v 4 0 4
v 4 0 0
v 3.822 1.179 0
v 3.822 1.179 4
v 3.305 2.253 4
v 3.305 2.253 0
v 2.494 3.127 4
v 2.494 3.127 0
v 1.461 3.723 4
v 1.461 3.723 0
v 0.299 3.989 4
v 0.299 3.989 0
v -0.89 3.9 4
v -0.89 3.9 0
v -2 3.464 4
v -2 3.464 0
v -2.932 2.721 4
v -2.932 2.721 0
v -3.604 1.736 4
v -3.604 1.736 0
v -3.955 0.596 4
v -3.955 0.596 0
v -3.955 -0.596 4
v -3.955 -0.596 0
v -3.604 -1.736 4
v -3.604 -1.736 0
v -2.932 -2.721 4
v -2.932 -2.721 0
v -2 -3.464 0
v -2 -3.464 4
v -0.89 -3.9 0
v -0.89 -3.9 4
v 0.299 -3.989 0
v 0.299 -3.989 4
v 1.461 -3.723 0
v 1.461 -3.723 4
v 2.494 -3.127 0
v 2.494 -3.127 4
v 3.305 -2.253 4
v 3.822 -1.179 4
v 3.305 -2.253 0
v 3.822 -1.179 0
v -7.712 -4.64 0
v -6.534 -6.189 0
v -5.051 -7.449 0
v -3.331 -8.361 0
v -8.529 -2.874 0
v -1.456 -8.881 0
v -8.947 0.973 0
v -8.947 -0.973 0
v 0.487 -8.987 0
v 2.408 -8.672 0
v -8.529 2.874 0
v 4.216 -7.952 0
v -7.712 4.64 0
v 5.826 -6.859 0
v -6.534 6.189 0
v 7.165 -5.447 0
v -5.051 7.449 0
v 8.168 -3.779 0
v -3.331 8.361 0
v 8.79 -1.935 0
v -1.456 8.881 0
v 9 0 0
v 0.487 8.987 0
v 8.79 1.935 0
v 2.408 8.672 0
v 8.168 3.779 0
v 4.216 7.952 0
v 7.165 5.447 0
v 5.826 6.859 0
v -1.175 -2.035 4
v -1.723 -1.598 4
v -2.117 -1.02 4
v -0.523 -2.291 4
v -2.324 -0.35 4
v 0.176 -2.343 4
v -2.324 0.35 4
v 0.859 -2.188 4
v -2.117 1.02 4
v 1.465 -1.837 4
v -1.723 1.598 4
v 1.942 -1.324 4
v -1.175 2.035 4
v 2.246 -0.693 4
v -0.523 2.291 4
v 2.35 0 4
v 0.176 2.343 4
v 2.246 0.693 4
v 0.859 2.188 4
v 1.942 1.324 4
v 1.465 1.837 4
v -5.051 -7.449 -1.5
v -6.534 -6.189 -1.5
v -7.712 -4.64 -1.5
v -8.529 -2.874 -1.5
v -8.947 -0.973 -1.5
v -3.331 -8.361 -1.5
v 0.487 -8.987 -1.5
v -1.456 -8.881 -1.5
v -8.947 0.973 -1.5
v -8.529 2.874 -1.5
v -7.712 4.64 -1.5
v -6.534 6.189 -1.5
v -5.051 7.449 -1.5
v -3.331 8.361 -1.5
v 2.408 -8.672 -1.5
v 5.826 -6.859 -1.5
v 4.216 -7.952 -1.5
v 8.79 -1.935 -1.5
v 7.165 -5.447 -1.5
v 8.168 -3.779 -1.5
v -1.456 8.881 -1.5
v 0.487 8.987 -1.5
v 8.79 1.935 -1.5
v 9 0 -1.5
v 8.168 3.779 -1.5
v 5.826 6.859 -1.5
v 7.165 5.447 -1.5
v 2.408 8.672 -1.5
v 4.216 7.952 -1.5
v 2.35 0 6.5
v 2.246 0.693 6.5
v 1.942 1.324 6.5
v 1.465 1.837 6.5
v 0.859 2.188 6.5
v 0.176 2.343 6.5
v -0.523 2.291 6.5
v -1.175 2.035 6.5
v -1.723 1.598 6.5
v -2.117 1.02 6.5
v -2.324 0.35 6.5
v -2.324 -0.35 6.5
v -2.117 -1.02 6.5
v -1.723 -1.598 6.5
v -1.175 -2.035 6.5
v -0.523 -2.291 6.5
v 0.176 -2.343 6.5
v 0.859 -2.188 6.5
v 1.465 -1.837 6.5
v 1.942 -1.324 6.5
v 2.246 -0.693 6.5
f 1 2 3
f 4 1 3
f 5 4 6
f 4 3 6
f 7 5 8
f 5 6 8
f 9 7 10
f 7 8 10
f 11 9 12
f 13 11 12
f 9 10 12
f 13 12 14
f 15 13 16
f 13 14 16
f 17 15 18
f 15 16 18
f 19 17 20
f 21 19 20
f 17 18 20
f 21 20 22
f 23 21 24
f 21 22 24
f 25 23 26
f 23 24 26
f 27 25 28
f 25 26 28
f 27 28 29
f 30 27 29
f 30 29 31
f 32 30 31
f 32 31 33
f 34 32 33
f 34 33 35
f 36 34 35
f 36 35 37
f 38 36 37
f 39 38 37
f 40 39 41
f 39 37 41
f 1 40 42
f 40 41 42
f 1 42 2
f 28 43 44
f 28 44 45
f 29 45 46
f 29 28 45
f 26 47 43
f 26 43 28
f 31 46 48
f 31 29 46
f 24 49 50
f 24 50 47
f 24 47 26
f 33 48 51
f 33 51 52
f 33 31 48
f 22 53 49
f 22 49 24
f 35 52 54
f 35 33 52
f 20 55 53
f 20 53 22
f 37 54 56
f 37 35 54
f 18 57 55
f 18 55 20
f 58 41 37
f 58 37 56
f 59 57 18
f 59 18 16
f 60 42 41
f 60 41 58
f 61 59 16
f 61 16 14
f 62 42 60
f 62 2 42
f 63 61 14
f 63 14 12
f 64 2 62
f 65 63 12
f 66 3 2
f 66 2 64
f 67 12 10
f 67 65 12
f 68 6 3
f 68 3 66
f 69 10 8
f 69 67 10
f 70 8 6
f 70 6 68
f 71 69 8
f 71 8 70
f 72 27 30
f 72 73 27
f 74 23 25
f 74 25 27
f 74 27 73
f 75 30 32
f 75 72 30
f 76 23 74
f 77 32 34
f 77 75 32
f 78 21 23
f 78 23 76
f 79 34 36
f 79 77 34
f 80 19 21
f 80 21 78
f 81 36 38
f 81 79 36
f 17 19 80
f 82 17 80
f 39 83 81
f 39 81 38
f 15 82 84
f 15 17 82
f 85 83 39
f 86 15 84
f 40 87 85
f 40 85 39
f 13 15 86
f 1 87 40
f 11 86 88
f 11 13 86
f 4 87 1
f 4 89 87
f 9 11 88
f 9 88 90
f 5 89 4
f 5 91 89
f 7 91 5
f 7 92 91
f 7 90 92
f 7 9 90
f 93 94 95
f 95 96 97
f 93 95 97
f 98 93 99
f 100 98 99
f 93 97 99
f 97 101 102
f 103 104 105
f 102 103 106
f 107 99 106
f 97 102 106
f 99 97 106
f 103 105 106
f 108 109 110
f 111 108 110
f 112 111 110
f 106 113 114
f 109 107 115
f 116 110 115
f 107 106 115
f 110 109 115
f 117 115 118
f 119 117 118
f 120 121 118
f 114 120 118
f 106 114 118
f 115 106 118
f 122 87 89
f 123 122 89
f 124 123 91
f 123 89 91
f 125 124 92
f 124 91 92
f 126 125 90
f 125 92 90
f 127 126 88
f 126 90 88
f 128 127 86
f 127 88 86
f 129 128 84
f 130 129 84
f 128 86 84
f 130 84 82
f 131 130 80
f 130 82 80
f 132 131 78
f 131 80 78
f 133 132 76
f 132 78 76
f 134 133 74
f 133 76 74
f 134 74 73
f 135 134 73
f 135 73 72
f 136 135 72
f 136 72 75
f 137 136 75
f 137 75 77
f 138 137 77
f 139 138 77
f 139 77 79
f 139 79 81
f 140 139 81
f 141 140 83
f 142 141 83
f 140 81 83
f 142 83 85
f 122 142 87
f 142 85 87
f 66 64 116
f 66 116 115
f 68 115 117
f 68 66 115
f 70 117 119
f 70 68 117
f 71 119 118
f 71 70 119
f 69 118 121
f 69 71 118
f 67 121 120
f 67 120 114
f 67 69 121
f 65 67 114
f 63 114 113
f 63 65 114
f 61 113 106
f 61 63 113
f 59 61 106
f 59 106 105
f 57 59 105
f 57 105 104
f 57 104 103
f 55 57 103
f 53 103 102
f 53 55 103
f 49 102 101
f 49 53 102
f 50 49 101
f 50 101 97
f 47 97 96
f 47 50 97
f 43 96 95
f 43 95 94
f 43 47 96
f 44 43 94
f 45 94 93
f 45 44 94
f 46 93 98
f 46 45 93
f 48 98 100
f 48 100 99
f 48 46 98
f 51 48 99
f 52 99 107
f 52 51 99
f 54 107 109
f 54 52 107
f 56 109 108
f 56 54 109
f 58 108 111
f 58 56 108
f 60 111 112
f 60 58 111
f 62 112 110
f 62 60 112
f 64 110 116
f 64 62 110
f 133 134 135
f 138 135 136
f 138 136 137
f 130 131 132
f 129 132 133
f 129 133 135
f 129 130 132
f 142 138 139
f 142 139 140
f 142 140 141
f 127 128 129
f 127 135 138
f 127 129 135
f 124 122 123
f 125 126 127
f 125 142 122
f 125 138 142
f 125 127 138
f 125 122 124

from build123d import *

# Parameters (mm, degrees)
F0_R     = 9
F0_R_2   = 4
F1_DEPTH = 1.5
F2_DEPTH = 4
F3_R     = 2.35
F4_DEPTH = 2.5


# Not quite as in the source:
# - a feature names something its author has since deleted; it is built from what else it names


with BuildPart() as f1:
    # F0 (on Top) → F1 (new body)
    with BuildSketch(Plane.XY):
        Circle(F0_R)
        Circle(F0_R_2, mode=Mode.SUBTRACT)
        Circle(F0_R_2)
    extrude(amount=-F1_DEPTH)

    # F0 (on Top) → F2 (join)
    with BuildSketch(Plane.XY):
        Circle(F0_R_2)
    extrude(amount=F2_DEPTH)

    # F3 (on face) → F4 (join)
    with BuildSketch(Plane.XY.offset(4)):
        Circle(F3_R)
    extrude(amount=F4_DEPTH)


solid = f1.part
